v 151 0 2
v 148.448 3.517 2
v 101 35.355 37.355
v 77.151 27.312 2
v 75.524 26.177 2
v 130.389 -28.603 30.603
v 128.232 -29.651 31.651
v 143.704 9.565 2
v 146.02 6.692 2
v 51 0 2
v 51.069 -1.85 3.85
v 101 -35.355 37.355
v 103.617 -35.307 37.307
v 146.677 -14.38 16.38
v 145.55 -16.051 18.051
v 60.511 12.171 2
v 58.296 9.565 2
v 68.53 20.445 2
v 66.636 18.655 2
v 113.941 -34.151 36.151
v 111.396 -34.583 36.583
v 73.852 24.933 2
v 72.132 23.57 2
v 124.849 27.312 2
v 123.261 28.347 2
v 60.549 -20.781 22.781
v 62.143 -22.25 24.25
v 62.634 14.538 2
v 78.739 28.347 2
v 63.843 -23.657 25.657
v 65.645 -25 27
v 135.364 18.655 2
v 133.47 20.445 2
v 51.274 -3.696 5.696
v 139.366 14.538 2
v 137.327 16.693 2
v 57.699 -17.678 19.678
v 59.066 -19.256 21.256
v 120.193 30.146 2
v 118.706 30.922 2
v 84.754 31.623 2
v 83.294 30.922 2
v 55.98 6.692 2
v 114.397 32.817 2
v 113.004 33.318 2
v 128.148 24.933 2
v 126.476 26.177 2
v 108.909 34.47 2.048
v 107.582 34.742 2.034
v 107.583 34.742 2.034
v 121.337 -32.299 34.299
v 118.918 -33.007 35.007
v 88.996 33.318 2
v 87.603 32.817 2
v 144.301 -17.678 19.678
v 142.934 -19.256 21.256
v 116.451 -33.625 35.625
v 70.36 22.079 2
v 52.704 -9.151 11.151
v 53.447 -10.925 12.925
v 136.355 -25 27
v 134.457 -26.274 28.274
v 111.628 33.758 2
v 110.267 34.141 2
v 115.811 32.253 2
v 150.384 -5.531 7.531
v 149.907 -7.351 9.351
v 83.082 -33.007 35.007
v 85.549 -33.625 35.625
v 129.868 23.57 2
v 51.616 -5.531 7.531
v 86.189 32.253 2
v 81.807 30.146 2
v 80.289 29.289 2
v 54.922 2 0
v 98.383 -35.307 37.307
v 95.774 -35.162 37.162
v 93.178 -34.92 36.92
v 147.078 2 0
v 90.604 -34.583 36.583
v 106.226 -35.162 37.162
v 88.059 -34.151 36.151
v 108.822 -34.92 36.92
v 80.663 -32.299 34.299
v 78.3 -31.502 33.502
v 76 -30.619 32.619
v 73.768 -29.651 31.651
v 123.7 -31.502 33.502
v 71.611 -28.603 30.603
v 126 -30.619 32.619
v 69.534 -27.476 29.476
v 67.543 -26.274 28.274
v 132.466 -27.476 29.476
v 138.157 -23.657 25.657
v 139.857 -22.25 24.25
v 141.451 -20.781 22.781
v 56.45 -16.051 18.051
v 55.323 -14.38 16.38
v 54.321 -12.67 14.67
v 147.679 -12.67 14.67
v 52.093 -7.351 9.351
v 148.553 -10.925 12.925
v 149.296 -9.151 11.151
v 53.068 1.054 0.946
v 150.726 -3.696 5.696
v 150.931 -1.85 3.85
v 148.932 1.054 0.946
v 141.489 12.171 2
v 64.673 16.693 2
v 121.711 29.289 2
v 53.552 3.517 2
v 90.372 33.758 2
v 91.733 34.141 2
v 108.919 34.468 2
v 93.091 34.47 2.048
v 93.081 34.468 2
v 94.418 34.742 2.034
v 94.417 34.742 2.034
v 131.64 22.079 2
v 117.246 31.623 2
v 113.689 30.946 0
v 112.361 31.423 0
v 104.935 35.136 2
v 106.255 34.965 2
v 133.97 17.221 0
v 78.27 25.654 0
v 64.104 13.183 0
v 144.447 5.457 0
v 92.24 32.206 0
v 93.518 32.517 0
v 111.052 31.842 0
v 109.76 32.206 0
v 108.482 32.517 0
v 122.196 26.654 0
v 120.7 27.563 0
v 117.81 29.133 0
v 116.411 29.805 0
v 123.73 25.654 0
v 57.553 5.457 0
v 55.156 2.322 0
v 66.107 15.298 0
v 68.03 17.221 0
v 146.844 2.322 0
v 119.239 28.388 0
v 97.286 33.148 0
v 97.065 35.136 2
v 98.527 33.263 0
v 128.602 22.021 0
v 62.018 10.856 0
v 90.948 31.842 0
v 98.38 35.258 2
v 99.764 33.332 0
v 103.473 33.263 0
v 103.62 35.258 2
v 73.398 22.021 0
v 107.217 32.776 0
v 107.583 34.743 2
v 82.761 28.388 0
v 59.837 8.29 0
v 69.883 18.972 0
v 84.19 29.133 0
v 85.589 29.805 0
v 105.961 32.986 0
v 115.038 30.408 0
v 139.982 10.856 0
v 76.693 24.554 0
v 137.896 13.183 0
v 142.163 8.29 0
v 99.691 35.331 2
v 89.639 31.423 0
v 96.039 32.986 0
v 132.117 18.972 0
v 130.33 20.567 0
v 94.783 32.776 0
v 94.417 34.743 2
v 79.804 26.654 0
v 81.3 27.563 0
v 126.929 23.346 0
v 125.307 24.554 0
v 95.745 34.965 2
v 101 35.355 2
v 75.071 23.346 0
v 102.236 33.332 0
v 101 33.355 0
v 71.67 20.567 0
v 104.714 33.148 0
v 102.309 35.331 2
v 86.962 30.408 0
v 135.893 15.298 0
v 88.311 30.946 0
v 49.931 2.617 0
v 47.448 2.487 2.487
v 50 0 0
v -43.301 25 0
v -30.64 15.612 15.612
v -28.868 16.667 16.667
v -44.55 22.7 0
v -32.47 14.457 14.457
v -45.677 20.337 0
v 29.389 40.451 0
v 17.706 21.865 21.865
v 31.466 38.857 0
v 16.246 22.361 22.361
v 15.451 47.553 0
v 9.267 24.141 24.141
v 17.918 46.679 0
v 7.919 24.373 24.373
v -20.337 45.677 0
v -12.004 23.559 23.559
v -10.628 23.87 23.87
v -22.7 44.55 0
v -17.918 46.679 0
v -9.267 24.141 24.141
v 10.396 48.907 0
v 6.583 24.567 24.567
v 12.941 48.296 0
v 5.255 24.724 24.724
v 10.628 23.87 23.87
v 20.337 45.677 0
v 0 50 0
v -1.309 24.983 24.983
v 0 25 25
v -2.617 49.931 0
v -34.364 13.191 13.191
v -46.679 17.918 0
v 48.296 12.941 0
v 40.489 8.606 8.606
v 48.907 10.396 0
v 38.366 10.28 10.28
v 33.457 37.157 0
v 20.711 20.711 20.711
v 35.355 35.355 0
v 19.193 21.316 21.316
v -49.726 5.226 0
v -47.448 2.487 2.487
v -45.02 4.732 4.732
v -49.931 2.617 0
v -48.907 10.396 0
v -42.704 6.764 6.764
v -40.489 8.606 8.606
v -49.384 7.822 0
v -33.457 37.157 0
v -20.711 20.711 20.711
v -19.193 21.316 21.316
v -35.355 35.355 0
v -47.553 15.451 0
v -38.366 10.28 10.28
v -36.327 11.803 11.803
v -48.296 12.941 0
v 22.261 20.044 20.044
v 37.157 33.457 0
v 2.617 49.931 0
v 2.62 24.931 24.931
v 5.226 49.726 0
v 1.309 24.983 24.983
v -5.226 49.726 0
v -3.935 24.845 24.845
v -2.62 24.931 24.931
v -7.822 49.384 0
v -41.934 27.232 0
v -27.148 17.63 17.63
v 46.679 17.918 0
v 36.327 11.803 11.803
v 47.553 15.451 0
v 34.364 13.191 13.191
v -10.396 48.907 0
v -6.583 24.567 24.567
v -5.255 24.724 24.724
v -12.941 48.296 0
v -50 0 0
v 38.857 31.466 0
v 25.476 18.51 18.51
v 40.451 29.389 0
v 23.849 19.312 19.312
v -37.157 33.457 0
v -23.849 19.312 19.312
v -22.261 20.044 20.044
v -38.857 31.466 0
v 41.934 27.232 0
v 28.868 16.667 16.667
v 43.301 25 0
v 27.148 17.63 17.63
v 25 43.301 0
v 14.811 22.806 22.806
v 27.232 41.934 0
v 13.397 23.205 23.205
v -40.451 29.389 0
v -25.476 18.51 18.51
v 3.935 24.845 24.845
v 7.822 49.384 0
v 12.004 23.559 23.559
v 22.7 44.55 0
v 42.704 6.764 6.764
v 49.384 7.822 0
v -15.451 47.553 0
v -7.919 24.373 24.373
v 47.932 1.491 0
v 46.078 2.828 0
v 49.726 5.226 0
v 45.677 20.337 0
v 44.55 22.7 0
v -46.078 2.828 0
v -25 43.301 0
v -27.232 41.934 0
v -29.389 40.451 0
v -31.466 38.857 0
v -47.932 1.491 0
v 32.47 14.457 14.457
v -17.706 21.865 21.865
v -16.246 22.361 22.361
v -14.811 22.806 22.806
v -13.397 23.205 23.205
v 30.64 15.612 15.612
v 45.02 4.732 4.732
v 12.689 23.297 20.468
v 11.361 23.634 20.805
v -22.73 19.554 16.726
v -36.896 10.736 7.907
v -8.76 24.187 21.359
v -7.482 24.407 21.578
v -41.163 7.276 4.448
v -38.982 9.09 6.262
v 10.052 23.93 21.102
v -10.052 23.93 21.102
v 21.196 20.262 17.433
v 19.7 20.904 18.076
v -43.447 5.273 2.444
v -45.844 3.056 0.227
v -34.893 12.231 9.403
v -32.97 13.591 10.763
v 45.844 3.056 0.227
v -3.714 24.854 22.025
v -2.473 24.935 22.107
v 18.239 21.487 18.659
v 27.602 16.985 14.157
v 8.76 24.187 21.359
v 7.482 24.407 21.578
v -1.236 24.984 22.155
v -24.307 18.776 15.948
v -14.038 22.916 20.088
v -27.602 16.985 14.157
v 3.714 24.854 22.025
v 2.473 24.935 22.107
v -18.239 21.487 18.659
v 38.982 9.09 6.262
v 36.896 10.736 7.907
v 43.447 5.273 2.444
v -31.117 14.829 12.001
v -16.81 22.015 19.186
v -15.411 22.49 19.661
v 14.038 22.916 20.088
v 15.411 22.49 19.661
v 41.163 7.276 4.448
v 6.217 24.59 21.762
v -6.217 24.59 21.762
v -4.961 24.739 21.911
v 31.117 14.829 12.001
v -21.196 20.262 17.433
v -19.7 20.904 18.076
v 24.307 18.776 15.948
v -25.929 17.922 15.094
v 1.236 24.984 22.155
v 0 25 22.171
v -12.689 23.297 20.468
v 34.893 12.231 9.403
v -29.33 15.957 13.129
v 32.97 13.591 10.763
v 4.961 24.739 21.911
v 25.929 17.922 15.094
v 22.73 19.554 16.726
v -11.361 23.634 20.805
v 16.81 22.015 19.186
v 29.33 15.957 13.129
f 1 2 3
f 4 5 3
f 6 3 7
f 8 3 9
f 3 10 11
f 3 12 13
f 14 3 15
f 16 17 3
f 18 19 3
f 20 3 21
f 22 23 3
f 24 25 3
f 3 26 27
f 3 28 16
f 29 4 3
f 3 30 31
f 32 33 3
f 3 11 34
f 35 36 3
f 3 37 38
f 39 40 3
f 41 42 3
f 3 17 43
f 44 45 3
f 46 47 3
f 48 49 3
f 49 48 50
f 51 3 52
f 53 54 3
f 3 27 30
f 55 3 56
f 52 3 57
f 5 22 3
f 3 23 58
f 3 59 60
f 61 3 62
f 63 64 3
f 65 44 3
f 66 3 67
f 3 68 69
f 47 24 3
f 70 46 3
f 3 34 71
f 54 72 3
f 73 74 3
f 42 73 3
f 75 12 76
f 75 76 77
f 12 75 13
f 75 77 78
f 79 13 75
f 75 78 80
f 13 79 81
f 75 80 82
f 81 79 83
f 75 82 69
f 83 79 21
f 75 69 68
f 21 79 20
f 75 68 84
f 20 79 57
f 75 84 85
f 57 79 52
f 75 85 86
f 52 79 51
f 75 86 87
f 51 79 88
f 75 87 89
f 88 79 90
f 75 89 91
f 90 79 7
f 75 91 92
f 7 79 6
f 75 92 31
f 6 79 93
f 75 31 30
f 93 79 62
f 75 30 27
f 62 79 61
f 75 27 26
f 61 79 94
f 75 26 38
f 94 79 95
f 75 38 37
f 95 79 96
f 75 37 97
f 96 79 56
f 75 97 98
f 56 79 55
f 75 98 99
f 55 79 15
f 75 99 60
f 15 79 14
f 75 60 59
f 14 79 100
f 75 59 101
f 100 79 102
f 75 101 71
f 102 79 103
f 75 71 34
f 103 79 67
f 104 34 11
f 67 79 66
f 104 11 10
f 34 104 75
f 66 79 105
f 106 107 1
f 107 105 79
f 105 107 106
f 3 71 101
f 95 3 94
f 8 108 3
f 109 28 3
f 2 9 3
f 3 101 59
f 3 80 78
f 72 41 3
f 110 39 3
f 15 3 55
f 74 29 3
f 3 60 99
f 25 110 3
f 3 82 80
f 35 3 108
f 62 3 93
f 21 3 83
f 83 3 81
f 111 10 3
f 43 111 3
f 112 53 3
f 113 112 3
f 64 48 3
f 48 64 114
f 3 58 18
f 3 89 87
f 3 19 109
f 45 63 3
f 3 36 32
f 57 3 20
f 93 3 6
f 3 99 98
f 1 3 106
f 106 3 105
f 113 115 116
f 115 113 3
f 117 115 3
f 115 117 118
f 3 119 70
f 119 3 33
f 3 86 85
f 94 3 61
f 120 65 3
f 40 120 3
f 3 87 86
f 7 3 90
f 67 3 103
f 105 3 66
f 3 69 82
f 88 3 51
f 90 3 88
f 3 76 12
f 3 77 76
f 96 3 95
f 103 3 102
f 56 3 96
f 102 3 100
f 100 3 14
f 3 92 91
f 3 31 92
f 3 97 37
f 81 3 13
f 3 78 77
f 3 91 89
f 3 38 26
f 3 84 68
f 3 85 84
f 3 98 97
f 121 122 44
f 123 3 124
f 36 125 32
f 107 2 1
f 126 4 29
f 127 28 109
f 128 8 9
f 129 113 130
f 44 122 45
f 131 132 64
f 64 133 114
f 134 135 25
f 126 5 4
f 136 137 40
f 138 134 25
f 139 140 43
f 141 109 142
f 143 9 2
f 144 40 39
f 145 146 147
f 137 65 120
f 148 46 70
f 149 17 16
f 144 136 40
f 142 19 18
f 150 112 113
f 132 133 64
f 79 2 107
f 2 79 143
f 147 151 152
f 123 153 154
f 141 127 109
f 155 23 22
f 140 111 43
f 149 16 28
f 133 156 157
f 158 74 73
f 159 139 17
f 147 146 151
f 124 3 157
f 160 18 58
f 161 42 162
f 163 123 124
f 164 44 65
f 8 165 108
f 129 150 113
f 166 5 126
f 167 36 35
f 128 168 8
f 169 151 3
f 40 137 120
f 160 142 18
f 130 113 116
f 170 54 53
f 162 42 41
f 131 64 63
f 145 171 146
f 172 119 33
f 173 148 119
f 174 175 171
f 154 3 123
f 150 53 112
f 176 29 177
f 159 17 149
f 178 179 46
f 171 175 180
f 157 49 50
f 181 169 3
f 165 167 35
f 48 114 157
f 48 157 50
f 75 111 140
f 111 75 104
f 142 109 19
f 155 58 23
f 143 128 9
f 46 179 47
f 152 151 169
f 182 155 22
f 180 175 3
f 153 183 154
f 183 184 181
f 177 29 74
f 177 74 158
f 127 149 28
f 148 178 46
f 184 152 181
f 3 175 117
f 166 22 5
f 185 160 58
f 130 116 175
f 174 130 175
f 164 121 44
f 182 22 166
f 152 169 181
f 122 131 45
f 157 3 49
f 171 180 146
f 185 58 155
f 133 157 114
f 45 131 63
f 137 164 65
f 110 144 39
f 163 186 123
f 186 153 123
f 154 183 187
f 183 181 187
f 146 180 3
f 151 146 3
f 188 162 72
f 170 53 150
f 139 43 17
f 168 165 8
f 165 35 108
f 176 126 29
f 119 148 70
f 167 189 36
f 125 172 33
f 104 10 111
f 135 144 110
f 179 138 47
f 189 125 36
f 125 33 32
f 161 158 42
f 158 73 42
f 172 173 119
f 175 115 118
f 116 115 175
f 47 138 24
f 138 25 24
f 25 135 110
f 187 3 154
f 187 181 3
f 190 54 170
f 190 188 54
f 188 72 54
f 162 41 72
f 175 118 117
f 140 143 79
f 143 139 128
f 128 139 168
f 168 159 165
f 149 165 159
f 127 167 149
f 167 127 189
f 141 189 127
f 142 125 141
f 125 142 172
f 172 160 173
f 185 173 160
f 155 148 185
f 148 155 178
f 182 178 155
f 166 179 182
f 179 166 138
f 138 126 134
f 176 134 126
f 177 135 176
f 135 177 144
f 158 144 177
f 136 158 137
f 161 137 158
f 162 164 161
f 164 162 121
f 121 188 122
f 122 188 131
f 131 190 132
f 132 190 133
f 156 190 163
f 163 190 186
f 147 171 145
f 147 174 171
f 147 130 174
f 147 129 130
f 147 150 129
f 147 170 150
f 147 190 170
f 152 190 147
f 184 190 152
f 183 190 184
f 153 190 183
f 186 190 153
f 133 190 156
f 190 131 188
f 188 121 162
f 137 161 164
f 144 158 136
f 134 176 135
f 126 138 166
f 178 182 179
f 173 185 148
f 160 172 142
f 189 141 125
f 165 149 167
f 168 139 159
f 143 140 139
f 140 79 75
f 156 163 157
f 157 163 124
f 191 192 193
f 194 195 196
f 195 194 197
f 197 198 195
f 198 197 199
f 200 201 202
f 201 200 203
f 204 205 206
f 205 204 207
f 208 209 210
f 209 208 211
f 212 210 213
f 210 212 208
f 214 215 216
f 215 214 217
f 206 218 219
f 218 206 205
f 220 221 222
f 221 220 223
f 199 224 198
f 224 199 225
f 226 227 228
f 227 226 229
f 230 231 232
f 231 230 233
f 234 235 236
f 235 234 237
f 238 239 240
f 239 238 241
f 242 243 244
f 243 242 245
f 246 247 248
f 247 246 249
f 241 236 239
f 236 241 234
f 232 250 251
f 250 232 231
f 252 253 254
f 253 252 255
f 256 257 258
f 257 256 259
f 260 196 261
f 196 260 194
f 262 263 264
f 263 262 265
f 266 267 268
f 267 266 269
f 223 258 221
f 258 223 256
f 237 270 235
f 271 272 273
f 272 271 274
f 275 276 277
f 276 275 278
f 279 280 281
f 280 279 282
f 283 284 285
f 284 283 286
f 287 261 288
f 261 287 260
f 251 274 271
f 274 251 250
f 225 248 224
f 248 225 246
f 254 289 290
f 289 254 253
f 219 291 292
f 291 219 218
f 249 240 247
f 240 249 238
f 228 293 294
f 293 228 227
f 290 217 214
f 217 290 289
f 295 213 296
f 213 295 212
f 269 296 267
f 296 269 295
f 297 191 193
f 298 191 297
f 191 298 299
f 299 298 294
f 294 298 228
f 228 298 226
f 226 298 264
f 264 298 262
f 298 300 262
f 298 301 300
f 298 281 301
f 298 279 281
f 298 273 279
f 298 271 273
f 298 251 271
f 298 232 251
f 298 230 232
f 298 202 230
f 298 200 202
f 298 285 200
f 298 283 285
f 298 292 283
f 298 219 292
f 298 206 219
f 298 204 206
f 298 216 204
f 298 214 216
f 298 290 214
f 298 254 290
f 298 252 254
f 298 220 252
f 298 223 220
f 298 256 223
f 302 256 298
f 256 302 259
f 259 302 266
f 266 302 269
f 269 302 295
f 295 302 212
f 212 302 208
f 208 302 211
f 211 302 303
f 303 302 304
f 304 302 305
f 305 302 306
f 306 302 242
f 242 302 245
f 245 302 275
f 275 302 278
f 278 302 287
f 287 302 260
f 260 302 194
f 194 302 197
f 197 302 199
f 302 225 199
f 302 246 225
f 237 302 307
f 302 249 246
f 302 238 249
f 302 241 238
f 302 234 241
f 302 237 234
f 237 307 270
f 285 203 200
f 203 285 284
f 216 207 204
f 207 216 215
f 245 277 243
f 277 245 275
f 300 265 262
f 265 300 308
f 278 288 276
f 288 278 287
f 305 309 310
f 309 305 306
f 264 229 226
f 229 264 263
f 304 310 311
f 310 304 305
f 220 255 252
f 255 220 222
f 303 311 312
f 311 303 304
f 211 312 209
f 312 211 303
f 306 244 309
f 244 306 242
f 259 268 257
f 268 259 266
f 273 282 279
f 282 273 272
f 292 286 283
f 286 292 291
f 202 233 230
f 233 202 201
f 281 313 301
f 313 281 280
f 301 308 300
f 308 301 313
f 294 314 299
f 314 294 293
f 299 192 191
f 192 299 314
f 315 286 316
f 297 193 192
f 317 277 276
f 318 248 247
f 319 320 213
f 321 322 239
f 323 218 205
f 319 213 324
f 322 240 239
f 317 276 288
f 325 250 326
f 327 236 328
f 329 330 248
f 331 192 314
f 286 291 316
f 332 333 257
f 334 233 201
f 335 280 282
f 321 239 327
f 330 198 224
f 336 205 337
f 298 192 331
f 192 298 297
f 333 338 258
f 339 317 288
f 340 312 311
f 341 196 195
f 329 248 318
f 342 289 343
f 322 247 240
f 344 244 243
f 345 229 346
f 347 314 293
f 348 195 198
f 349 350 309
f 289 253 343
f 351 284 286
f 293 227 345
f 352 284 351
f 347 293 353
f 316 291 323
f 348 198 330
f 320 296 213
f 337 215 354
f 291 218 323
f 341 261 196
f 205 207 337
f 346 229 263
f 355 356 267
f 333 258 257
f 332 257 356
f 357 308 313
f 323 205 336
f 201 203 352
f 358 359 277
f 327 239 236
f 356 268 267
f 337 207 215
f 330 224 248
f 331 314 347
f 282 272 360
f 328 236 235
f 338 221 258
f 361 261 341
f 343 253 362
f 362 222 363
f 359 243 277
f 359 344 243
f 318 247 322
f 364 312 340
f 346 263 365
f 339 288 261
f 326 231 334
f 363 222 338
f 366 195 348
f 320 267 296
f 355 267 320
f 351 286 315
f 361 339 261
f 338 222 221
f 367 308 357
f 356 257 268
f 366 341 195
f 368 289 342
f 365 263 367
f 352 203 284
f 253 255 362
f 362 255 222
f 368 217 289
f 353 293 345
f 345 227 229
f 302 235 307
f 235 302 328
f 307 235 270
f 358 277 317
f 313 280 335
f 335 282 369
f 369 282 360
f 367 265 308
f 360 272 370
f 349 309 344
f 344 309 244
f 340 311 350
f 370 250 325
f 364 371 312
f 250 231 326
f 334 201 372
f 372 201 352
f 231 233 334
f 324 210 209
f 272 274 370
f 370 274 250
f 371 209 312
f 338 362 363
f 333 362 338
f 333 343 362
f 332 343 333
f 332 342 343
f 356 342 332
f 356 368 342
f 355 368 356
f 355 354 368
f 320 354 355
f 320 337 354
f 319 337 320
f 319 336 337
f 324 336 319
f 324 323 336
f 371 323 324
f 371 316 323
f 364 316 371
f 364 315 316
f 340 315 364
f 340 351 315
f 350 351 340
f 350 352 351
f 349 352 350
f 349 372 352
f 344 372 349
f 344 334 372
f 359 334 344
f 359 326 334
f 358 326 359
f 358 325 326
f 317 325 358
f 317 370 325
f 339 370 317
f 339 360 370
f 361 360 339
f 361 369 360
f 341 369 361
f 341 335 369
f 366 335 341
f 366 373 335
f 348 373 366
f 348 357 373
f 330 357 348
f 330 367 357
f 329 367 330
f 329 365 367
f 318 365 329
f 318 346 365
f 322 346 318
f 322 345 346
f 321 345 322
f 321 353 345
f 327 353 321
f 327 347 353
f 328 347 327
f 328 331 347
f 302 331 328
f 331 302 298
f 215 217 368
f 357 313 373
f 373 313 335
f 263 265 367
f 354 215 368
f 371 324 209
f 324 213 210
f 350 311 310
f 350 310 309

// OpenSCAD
// file conic_section.scad
// cuts a cone with a plane at height sliceheight and at angle slicetilt. 
// (c) 2020 Rich Cameron, CC-BY International license

h = 50; // height of cone, mm
n = 120;
r = h;  // radius of cone, mm

rim = 2;

slicetilt = 45;// angle of the cutting plane relative to cone base
slicerotate = 0;
 
//sliceheight = h * 3 / 4;
//slicehoffset = r * 1 / 4;
 
sliceheight = 0; // height of the rotation axis above cone base
slicehoffset = 0; // y-axist offset of slice rotation axis
//slicehoffset = r / 8 - 2 * h / tan(slicetilt);
// 2nd cone hyperbola equation if slicehoffset of other cone = -r/8. 

echo(slicehoffset );

sliceangle = [slicetilt, 0, slicerotate];

translate((slicetilt > atan2(h, r)) ? [0, -2, sliceheight] : [r * 2 + 1, 0, rim]) rotate((slicetilt > atan2(h, r)) ? sliceangle : 0) intersection() {
	shape();
	%shape();
	hull() {
		translate([0, 0, -rim]) linear_extrude() intersection() {
			offset(-rim) projection(cut = true) shape(true);
			offset(-rim) projection(cut = true) translate([0, 0, rim * 2]) shape(true);
		}
		intersection() {
			linear_extrude(1000) square(1000, center = true);
			shape();
			//%shape();
		}
	}
}

translate([0, 0, sliceheight]) rotate(sliceangle) difference() {
	shape();
	%shape();
	hull() {
		translate([0, 0, -rim]) linear_extrude() intersection() {
			offset(-rim) projection(cut = true) shape(true);
			offset(-rim) projection(cut = true) translate([0, 0, rim * 2]) shape(true);
		}
		intersection() {
			linear_extrude(1000) square(1000, center = true);
			shape();
			//%shape();
		}
	}
	linear_extrude(1000) square(1000, center = true);
}

module shape(oversize = false) rotate([-sliceangle[0], 0, 0]) rotate([0, -sliceangle[1], 0]) translate([0, -slicehoffset, -sliceheight]) rotate([0, 0, -sliceangle[2]]) cylinder(r1 = oversize ? 2 * r : r, r2 = 0, h = oversize ? 2 * h : h, center = oversize, $fn = n);
